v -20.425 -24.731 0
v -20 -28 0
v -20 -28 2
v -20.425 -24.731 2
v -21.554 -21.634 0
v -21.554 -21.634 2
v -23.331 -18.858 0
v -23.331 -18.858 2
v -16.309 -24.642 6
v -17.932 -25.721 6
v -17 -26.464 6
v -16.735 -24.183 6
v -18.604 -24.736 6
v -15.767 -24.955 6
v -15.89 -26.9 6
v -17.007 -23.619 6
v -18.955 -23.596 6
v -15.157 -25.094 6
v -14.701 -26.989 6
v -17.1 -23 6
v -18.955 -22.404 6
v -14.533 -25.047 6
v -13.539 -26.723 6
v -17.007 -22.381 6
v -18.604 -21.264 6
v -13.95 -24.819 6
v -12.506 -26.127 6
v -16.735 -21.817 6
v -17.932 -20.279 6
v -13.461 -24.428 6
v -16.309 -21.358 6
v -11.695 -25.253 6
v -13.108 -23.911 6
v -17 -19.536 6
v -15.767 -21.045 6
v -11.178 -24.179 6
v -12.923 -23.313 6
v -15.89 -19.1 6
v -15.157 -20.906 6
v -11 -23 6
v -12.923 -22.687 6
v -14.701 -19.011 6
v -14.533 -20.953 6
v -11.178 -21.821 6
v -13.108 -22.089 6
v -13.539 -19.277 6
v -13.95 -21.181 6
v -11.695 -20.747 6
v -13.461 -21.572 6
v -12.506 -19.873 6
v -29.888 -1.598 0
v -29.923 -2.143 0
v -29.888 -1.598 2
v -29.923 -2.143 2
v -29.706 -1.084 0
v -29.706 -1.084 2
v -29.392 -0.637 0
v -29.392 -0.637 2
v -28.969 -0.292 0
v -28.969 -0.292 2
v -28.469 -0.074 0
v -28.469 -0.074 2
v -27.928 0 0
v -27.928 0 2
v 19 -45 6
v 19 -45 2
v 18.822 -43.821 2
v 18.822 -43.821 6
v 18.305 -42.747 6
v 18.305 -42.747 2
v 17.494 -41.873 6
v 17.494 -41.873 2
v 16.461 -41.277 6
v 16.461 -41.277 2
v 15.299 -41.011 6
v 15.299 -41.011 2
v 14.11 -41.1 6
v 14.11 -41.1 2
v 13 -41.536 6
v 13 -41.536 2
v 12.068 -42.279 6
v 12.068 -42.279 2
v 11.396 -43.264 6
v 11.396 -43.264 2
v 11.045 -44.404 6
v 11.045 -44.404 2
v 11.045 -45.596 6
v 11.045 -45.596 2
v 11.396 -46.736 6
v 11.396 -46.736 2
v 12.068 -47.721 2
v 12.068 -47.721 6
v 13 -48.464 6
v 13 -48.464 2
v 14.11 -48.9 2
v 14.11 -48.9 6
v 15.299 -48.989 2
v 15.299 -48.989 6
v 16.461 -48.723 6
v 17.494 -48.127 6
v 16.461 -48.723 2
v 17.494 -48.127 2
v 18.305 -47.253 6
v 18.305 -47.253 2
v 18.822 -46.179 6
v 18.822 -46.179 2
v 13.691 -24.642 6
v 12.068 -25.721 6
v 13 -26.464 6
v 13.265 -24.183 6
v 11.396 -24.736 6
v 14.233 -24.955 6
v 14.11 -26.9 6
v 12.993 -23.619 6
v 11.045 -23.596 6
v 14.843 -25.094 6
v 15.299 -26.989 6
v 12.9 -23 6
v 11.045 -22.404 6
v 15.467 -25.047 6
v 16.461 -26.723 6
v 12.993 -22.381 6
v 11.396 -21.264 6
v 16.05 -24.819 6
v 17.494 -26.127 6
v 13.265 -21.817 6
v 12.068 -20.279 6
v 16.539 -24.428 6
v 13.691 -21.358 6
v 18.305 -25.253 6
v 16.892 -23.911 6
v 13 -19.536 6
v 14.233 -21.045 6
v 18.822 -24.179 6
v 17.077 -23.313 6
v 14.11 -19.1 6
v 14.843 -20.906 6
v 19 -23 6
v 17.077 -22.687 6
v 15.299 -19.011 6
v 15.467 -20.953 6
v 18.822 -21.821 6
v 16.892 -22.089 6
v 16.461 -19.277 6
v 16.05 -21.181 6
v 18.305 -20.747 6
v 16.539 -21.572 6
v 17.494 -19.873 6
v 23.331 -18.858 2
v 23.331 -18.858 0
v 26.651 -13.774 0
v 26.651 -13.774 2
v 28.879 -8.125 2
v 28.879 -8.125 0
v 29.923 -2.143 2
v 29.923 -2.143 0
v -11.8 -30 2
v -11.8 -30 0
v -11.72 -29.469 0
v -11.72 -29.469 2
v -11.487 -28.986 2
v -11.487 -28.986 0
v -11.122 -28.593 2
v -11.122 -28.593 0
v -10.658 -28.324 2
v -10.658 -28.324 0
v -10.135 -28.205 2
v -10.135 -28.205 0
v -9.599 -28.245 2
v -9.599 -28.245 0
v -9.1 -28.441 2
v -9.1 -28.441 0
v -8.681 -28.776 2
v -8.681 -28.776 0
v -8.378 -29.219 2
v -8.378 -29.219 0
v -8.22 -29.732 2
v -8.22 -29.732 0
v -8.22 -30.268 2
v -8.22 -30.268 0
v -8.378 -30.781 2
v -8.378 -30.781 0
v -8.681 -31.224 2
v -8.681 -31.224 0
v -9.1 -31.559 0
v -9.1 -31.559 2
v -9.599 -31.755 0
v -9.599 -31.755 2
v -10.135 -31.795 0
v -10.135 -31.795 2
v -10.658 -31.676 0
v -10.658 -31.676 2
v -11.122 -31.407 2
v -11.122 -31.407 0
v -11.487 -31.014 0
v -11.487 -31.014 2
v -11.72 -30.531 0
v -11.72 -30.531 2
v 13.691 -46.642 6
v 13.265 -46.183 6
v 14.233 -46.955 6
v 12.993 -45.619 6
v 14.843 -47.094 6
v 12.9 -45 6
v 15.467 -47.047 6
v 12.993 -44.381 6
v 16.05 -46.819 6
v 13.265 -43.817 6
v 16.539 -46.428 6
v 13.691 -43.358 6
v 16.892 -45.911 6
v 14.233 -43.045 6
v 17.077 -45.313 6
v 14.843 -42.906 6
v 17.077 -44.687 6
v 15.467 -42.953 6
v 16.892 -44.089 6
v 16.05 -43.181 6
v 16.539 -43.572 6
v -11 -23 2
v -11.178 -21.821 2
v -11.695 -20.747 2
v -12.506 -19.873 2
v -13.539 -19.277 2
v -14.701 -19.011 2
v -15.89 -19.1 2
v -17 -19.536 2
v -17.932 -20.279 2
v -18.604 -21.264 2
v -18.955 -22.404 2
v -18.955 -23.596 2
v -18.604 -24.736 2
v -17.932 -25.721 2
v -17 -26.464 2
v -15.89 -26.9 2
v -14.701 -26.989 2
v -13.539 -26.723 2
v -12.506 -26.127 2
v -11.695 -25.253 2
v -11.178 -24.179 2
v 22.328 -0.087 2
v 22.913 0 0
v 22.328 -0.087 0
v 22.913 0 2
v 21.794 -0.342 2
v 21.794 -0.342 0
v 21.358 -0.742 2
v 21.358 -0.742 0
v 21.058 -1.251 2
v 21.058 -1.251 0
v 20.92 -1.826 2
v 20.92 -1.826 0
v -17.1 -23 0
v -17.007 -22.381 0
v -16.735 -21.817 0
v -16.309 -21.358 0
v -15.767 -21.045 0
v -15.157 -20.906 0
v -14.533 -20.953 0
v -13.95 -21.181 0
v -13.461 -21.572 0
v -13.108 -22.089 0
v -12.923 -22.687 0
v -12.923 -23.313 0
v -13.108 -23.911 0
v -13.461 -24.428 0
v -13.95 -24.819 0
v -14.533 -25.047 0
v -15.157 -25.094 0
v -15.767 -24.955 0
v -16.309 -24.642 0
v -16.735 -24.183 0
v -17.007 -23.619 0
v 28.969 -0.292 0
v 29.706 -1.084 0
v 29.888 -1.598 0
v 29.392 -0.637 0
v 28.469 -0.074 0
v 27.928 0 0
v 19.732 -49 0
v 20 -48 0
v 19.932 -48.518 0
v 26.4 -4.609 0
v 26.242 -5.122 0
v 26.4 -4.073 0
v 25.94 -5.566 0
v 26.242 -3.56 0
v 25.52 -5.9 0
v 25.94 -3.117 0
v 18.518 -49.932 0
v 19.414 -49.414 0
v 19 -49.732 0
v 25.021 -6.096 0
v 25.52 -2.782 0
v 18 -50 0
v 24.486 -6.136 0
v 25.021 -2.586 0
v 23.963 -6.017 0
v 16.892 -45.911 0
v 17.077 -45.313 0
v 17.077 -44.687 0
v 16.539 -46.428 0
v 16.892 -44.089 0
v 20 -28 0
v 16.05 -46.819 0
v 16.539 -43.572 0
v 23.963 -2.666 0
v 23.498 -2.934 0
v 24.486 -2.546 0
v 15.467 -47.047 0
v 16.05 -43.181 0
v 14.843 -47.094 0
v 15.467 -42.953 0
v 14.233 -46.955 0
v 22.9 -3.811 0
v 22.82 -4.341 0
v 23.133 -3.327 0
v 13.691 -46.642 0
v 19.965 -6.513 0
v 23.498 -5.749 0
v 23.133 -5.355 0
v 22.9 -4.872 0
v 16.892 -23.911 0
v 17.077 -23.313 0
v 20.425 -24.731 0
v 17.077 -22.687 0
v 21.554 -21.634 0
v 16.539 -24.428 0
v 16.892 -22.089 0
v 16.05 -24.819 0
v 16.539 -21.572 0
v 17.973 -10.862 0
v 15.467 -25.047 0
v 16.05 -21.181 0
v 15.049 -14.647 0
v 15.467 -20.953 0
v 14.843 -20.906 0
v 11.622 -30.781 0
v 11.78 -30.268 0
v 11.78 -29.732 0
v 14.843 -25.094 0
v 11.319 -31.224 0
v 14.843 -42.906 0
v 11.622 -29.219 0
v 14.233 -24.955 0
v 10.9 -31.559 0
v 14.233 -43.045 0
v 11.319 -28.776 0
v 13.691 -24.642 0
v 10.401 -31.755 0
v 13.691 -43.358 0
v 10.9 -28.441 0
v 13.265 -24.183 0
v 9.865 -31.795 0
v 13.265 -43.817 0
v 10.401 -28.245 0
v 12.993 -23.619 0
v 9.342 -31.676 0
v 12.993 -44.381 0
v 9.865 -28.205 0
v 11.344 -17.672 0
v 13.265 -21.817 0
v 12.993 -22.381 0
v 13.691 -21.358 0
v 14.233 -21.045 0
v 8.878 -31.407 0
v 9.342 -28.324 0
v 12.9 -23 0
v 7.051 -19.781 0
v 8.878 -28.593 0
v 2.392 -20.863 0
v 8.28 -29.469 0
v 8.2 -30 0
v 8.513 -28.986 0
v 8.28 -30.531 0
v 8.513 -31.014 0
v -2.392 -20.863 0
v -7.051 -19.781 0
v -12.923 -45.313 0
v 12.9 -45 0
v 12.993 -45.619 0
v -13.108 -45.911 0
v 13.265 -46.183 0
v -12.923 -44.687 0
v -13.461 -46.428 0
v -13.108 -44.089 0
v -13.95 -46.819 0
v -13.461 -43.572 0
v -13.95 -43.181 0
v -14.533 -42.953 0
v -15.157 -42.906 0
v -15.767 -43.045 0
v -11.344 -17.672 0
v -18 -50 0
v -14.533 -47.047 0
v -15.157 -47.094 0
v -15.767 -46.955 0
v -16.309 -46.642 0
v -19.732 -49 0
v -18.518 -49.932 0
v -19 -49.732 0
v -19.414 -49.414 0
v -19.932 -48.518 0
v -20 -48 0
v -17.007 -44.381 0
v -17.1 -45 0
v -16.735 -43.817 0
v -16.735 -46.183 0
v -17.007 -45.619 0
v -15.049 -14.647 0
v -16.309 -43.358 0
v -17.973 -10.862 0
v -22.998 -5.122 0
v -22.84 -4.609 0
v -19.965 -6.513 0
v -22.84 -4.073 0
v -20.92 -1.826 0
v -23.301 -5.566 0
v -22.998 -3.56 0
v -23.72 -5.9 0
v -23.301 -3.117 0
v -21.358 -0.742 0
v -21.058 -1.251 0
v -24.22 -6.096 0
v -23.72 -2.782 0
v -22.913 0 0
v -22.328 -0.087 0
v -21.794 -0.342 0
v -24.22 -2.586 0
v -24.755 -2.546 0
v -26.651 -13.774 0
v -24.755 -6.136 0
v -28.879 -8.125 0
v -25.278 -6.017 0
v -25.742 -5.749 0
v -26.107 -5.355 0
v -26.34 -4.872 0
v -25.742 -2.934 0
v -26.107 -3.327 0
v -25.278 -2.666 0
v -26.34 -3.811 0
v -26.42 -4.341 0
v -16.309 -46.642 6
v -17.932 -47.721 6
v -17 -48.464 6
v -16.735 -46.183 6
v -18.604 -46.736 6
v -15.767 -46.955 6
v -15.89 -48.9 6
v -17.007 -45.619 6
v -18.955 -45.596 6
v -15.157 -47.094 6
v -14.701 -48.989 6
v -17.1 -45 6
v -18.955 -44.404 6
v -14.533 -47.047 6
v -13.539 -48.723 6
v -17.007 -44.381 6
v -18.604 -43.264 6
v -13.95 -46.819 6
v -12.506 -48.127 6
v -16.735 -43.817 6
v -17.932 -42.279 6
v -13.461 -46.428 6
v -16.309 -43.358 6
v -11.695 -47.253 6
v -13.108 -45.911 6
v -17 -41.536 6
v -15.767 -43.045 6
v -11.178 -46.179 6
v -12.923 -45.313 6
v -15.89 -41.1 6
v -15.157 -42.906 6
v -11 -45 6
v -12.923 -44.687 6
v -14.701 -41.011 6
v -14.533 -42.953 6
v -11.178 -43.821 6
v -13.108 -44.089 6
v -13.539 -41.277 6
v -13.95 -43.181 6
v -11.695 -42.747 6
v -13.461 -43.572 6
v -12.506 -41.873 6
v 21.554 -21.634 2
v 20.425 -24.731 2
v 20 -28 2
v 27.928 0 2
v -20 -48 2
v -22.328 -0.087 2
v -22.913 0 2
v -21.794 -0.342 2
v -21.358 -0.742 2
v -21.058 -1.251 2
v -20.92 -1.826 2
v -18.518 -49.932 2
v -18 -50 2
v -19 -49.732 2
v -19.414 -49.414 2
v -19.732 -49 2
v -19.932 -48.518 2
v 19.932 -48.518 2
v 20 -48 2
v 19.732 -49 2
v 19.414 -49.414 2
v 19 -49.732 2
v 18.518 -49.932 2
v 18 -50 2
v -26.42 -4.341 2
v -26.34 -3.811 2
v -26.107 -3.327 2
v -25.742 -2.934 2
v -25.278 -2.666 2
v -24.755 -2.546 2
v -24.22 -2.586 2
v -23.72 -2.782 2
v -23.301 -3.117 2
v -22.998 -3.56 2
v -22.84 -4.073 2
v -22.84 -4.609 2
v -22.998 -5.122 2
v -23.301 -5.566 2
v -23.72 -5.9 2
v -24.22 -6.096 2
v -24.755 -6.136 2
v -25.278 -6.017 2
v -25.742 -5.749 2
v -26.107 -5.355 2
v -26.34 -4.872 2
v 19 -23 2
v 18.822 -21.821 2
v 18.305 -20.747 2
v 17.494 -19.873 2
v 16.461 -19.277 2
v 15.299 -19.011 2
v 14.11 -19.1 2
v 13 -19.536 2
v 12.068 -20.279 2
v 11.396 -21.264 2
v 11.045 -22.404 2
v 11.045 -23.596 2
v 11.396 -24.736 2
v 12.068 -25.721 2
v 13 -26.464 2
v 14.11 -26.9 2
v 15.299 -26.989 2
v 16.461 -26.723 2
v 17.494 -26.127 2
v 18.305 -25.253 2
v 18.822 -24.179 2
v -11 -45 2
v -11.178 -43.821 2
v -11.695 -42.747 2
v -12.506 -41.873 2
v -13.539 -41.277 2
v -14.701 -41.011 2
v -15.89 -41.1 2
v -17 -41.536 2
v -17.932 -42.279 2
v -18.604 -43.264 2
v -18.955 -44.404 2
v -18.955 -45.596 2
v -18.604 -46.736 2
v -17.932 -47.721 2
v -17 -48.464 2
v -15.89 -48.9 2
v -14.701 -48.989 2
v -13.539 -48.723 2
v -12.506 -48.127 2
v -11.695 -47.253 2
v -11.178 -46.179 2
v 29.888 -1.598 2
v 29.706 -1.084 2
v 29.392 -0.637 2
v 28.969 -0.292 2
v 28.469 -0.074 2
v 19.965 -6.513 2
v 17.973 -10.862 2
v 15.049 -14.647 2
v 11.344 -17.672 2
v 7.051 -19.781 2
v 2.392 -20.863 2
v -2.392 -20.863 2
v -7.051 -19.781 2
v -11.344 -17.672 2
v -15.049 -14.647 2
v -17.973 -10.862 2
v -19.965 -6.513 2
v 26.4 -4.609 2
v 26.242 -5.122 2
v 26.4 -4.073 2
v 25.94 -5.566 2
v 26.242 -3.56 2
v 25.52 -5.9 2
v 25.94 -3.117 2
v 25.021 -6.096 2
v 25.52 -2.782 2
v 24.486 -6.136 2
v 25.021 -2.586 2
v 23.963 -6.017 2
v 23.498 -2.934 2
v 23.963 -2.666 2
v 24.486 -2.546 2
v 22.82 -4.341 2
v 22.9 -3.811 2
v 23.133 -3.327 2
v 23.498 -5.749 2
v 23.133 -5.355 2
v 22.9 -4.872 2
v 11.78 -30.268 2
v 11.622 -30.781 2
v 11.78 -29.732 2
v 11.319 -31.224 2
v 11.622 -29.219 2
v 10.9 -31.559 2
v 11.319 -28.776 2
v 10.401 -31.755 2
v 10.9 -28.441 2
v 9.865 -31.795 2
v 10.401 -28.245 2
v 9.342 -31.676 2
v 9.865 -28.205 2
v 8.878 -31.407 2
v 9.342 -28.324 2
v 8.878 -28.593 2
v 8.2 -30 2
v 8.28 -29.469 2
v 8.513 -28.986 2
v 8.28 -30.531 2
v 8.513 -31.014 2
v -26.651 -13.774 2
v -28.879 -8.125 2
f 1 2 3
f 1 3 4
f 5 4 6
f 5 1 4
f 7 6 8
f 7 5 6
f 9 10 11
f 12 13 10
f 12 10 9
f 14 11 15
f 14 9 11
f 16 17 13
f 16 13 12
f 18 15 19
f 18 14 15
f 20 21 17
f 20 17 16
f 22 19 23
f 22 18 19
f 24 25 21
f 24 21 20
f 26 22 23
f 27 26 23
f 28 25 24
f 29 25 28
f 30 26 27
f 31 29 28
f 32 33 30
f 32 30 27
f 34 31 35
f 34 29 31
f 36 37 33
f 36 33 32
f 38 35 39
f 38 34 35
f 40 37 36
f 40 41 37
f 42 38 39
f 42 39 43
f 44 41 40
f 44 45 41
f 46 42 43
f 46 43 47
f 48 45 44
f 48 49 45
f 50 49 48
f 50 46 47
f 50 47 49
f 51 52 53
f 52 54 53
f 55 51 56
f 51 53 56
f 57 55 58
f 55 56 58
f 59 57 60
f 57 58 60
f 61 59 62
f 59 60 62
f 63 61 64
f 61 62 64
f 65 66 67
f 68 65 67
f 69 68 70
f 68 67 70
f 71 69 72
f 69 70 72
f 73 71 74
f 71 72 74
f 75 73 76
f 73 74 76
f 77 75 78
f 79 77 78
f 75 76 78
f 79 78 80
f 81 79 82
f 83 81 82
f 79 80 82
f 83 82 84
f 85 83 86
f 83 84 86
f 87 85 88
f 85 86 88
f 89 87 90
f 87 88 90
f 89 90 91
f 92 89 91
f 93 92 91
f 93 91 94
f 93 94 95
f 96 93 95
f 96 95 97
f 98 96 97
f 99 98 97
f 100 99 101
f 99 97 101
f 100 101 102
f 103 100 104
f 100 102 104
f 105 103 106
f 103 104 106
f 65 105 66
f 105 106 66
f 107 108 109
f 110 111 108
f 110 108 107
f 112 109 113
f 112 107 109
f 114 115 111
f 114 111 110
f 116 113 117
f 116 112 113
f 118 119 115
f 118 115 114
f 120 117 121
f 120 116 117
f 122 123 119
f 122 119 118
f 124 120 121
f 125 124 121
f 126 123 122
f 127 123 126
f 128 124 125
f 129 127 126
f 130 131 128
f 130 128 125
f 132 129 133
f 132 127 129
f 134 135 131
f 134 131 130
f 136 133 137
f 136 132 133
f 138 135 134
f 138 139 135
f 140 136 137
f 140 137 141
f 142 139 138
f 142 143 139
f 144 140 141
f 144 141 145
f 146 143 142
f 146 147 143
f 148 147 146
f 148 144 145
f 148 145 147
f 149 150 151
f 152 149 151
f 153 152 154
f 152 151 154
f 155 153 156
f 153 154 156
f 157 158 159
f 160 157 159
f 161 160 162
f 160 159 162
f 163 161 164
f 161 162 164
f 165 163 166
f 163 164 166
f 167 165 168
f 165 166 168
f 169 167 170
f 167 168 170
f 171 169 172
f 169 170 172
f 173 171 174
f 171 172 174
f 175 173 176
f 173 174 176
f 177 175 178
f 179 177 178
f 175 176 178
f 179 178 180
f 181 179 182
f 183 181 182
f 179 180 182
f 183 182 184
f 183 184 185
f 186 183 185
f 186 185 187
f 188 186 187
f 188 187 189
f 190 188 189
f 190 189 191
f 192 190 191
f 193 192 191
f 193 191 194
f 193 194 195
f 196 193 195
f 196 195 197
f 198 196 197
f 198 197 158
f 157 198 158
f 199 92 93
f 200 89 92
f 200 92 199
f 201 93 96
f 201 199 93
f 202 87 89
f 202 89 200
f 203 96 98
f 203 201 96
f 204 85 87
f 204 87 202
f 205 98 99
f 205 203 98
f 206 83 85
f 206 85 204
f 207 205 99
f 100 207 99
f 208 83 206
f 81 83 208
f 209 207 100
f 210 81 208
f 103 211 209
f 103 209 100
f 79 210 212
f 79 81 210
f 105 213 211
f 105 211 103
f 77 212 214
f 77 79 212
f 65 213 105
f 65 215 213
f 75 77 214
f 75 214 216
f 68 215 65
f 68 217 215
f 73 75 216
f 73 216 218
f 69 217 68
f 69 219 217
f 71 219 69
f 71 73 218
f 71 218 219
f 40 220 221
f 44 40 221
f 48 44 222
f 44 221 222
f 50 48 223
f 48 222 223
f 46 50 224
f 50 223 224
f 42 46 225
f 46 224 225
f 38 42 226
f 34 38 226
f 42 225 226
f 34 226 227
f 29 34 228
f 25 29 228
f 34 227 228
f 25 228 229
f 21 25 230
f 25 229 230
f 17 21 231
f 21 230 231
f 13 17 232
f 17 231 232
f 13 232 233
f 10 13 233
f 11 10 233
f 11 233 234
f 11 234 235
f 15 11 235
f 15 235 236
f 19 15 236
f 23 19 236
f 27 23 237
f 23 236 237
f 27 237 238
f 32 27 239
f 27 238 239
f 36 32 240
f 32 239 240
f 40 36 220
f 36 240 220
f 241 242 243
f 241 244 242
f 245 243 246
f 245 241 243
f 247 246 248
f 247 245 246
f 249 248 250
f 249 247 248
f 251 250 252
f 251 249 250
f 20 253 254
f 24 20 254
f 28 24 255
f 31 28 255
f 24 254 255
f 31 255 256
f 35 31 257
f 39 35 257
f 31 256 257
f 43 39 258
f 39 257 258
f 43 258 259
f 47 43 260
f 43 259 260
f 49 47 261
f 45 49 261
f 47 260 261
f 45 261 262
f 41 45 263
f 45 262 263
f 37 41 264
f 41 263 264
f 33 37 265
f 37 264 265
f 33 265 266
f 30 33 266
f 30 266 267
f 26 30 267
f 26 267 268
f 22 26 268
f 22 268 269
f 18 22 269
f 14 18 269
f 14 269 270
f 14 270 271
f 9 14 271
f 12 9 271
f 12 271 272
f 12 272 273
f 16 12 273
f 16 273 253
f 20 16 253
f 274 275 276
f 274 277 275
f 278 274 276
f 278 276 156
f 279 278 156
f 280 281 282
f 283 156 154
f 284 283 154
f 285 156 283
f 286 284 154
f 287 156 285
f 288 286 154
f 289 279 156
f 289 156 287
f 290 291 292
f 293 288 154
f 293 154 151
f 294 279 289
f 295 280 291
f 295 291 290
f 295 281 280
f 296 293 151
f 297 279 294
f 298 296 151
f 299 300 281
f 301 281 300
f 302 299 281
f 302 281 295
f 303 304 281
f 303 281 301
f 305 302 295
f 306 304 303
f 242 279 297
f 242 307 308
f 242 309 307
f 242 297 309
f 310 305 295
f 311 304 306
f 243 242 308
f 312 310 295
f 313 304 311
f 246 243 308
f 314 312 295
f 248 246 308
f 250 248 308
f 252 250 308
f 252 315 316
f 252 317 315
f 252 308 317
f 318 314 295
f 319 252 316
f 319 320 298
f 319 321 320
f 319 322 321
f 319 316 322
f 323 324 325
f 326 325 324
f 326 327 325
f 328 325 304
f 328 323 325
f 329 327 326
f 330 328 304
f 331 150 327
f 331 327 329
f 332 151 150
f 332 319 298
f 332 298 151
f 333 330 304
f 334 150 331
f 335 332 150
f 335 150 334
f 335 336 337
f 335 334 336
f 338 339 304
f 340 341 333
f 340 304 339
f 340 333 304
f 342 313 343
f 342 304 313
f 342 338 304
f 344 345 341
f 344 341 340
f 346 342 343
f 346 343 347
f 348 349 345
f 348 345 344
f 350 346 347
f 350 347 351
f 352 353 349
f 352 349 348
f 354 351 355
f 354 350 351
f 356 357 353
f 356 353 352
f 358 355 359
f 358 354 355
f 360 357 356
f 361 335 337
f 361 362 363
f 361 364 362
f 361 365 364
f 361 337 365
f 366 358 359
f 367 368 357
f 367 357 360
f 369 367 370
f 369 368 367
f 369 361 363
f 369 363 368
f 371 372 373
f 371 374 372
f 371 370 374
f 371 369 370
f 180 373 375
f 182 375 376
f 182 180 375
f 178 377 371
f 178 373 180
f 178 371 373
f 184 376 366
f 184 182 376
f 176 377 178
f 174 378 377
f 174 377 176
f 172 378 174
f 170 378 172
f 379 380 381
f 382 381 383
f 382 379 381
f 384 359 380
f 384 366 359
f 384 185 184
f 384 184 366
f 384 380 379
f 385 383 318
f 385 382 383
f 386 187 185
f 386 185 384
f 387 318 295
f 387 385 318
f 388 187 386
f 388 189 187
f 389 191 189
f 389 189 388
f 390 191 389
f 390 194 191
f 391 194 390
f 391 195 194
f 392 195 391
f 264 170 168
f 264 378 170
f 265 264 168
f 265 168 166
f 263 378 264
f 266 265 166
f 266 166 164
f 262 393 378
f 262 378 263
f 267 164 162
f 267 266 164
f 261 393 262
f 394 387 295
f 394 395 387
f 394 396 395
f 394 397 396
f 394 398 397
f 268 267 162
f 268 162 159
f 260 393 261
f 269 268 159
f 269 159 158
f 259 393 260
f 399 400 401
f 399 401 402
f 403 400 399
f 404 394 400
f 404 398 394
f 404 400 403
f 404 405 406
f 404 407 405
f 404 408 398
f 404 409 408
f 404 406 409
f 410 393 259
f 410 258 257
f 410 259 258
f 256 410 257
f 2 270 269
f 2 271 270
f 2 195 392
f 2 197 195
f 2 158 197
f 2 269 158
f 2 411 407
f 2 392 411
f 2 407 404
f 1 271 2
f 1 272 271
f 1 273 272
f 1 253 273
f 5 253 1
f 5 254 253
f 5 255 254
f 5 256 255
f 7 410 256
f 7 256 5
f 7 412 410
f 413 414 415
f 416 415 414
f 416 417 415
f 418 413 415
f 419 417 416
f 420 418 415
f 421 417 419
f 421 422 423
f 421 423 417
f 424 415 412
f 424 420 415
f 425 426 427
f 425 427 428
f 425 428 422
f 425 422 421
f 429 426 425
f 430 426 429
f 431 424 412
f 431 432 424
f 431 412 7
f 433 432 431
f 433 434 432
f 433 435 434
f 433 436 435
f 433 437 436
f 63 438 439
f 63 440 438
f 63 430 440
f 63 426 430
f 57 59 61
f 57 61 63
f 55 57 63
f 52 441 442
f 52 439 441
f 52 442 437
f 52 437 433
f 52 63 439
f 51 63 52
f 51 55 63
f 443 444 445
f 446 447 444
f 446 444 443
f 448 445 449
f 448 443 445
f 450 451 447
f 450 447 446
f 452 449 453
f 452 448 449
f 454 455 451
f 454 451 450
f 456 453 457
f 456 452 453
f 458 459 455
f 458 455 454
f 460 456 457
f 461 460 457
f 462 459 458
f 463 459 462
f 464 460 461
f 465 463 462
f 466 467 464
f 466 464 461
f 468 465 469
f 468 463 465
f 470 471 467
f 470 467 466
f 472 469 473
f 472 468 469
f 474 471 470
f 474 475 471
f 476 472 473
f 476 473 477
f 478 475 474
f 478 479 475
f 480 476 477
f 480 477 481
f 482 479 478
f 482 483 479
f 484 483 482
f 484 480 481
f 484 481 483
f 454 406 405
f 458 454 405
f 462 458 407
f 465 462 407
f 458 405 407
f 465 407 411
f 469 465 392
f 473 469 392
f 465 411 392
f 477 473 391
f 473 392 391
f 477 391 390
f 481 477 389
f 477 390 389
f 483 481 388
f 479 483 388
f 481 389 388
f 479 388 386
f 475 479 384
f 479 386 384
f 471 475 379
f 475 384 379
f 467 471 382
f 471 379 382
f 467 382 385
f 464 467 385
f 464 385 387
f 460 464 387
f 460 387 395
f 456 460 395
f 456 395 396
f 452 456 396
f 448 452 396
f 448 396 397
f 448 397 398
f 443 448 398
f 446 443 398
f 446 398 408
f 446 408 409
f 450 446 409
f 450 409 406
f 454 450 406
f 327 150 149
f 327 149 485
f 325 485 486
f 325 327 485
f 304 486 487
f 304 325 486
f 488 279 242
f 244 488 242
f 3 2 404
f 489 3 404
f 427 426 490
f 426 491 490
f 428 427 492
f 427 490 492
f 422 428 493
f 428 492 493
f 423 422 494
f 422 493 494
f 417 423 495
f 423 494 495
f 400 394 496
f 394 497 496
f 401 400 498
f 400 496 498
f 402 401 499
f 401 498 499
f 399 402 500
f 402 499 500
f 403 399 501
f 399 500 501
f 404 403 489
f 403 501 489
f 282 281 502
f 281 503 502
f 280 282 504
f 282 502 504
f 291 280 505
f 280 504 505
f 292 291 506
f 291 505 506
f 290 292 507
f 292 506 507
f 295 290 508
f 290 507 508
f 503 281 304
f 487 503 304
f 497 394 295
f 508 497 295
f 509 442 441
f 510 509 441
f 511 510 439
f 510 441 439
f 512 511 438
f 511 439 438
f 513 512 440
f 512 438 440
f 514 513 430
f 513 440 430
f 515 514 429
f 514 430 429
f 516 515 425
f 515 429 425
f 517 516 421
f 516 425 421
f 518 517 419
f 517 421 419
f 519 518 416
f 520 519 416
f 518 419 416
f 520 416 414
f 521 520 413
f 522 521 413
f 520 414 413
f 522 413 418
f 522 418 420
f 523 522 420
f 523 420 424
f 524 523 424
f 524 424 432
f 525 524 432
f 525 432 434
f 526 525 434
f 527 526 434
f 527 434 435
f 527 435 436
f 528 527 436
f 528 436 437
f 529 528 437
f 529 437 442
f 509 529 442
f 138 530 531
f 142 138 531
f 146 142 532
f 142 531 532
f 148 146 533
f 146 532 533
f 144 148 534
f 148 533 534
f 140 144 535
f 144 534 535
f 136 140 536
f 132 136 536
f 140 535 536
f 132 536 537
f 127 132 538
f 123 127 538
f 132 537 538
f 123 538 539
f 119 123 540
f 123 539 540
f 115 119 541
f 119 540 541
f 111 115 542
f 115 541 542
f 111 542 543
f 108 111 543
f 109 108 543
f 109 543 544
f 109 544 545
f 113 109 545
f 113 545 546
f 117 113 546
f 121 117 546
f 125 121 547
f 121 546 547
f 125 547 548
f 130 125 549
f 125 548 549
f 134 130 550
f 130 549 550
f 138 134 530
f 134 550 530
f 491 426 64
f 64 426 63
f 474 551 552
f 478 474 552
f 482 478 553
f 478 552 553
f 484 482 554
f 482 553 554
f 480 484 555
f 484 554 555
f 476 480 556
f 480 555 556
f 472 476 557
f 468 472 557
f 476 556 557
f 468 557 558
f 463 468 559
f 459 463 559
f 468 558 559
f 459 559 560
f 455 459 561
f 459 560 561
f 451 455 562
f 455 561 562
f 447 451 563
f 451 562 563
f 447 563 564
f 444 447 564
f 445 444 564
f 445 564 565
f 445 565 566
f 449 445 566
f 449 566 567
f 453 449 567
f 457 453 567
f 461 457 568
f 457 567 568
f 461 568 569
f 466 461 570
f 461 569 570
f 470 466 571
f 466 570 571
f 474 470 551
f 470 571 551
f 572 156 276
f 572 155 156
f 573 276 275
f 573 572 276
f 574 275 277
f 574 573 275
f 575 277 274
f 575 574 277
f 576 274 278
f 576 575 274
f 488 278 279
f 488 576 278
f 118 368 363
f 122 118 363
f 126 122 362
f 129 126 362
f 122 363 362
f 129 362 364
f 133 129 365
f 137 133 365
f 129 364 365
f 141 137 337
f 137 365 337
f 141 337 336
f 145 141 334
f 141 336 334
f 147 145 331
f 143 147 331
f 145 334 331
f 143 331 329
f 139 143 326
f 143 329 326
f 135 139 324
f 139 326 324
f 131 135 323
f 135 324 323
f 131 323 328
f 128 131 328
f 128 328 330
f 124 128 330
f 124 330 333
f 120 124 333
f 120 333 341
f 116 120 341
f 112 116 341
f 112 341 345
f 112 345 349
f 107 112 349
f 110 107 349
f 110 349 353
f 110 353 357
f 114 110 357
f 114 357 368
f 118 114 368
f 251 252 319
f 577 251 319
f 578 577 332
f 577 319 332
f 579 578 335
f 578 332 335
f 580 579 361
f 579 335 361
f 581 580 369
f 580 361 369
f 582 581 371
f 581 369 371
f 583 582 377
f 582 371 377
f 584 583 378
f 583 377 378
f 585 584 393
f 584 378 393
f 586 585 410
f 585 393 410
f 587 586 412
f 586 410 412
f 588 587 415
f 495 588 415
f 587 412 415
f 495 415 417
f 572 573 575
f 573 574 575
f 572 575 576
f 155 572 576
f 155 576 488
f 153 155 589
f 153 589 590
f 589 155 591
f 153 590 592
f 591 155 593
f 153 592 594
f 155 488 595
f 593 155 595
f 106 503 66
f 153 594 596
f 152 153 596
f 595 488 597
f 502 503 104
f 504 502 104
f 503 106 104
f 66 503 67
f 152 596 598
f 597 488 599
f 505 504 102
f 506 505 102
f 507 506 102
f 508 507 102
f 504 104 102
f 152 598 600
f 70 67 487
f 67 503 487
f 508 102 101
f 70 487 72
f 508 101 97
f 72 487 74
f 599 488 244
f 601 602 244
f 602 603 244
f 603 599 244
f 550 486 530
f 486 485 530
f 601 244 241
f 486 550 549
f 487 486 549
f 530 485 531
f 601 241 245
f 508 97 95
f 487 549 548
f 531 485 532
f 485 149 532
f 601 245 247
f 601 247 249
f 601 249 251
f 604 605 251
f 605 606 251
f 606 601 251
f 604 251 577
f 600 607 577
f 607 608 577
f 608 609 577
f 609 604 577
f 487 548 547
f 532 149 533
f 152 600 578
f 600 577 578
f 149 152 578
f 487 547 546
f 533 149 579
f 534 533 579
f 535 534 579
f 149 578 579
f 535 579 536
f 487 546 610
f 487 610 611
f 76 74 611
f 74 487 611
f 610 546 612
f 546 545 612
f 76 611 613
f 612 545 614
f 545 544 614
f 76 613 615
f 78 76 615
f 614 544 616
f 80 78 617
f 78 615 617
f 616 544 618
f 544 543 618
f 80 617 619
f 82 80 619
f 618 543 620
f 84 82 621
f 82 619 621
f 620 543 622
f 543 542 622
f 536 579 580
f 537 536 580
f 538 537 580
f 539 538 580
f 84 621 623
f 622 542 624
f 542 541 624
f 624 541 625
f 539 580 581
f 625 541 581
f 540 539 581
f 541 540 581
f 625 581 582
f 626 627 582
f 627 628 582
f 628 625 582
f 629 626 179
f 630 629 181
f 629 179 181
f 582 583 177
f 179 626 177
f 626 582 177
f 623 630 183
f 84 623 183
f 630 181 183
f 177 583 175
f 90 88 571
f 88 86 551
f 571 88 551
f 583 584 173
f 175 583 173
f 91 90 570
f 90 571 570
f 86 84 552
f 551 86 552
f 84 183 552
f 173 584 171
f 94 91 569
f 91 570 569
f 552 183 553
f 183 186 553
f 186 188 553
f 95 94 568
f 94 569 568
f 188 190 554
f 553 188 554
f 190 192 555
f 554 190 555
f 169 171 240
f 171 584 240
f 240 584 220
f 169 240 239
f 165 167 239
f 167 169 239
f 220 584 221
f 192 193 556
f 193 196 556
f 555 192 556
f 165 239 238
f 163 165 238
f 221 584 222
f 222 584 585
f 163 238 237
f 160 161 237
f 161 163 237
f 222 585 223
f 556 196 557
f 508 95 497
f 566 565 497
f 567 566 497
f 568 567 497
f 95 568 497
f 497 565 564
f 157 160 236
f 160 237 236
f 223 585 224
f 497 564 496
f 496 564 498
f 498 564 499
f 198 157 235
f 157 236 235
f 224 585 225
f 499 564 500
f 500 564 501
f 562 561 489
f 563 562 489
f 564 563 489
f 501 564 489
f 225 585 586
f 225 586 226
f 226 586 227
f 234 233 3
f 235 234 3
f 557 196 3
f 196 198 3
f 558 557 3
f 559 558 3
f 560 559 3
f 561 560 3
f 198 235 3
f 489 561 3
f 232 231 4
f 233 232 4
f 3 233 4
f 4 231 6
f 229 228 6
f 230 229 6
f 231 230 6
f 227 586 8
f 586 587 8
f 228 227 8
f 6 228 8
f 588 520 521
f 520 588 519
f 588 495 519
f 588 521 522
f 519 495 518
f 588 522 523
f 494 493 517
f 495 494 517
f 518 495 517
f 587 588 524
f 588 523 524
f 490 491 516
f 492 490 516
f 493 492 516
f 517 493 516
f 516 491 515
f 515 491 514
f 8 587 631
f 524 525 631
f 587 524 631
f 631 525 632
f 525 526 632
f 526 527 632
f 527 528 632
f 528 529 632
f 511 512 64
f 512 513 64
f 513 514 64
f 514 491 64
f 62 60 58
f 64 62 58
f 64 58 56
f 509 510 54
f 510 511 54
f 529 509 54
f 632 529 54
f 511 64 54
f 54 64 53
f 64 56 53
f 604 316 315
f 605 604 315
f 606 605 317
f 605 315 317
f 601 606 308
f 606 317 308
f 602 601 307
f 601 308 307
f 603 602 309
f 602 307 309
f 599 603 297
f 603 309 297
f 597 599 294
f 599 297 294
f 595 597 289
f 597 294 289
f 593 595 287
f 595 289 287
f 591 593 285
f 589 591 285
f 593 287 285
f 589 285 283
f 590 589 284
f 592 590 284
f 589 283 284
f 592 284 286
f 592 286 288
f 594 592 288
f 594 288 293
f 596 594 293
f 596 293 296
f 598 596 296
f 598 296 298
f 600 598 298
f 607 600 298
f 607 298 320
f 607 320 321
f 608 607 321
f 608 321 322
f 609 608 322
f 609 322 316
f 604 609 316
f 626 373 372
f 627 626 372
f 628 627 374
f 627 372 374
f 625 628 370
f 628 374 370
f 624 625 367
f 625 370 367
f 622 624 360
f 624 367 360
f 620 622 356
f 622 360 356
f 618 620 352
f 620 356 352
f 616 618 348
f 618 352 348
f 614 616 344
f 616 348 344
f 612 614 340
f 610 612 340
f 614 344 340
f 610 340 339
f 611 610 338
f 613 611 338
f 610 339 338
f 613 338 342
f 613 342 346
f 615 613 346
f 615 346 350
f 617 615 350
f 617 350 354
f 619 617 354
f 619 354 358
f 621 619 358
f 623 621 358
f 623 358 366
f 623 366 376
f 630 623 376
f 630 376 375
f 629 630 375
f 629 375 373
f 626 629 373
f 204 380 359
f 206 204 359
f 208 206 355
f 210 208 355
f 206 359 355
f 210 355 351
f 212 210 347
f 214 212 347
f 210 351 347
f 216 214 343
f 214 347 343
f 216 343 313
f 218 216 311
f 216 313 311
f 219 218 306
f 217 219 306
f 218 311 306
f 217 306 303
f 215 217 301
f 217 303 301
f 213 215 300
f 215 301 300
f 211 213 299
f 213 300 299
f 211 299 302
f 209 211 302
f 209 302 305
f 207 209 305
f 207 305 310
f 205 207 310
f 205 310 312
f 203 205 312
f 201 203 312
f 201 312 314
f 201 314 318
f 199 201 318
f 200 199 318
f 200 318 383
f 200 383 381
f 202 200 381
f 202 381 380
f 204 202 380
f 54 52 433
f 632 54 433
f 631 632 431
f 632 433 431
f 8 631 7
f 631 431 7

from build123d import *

# Parameters (mm, degrees)
BOSS_EXTRUDE1_DEPTH        = 2
FILLET1_R                  = 15
FILLET3_R                  = 2
M3_CLEARANCE_HOLE1_D       = 3.6
SKETCH7_R                  = 4
BOSS_EXTRUDE2_DEPTH        = 4
F_4_2_4_2_DIAMETER_HOLE1_D = 4.2


with BuildPart() as part:
    # Sketch1 → Boss-Extrude1 (new body)
    with BuildSketch(Plane.XY):
        with BuildLine():
            Line((-10.770329614, -28), (-20, -28))
            Line((-20, -28), (-20, -50))
            Line((-20, -50), (20, -50))
            Line((20, -50), (20, -28))
            Line((20, -28), (10.770329614, -28))
            ThreePointArc((10.770329614, -28), (24.729636961, -16.983670268), (30, 0))
            Line((30, 0), (21, 0))
            ThreePointArc((21, 0), (0, -21), (-21, 0))
            Line((-21, 0), (-30, 0))
            ThreePointArc((-30, 0), (-24.729636961, -16.983670268), (-10.770329614, -28))
        make_face()
    extrude(amount=BOSS_EXTRUDE1_DEPTH)

    # Fillet1
    # the kernel refuses this fillet: 15 mm, written as the material it adds along each edge
    with BuildSketch(Plane(origin=(-10.770329614, -28, 0), x_dir=(-0.8085477056225583, 0.588430631198357, 0), z_dir=(0, 0, 1))) as fillet1_piece_1:
        with BuildLine():
            CenterArc((19.419330938, 14.488463805), FILLET1_R, 217.144663105, 37.84908673)
            Line((7.462628814, 5.431020771), (0, 0))
            ThreePointArc((0, 0), (7.767732375, 1.023072389), (15.53546475, 0))
        make_face()
    extrude(amount=2)
    with BuildSketch(Plane(origin=(10.770329614, -28, 0), x_dir=(0.8085477056225584, 0.5884306311983569, 0), z_dir=(0, 0, 1))) as fillet1_piece_2:
        with BuildLine():
            CenterArc((19.419330938, -14.488463805), FILLET1_R, 105.006250165, 37.84908673)
            Line((7.462628814, -5.431020771), (0, 0))
            ThreePointArc((0, 0), (7.767732375, -1.023072389), (15.53546475, 0))
        make_face()
    extrude(amount=2)

    # Fillet3
    fillet3_edges = [part.edges().sort_by_distance(p)[0] for p in [
        (20, -50, 1),
        (-20, -50, 1),
        (-30, 0, 1),
        (-21, 0, 1),
        (21, 0, 1),
        (30, 0, 1),
    ]]
    fillet(fillet3_edges, radius=FILLET3_R)

    # M3 Clearance Hole1 (through all)
    with Locations(Plane.XY.offset(2)):
        with Locations((10, -30), (-24.620193825, -4.341204442), (-10, -30), (24.620193825, -4.341204442)):
            Hole(M3_CLEARANCE_HOLE1_D / 2)

    # Sketch7 → Boss-Extrude2 (add)
    with BuildSketch(Plane.XY.offset(2)):
        with Locations((-15, -45)):
            Circle(SKETCH7_R)
        with Locations((15, -45)):
            Circle(SKETCH7_R)
        with Locations((15, -23)):
            Circle(SKETCH7_R)
        with Locations((-15, -23)):
            Circle(SKETCH7_R)
    extrude(amount=BOSS_EXTRUDE2_DEPTH)

    # Ø4.2 (4.2) Diameter Hole1 (through all)
    with Locations(Plane.XY.offset(6)):
        with Locations((-15, -23), (15, -23), (15, -45), (-15, -45)):
            Hole(F_4_2_4_2_DIAMETER_HOLE1_D / 2)


solid = part.part
